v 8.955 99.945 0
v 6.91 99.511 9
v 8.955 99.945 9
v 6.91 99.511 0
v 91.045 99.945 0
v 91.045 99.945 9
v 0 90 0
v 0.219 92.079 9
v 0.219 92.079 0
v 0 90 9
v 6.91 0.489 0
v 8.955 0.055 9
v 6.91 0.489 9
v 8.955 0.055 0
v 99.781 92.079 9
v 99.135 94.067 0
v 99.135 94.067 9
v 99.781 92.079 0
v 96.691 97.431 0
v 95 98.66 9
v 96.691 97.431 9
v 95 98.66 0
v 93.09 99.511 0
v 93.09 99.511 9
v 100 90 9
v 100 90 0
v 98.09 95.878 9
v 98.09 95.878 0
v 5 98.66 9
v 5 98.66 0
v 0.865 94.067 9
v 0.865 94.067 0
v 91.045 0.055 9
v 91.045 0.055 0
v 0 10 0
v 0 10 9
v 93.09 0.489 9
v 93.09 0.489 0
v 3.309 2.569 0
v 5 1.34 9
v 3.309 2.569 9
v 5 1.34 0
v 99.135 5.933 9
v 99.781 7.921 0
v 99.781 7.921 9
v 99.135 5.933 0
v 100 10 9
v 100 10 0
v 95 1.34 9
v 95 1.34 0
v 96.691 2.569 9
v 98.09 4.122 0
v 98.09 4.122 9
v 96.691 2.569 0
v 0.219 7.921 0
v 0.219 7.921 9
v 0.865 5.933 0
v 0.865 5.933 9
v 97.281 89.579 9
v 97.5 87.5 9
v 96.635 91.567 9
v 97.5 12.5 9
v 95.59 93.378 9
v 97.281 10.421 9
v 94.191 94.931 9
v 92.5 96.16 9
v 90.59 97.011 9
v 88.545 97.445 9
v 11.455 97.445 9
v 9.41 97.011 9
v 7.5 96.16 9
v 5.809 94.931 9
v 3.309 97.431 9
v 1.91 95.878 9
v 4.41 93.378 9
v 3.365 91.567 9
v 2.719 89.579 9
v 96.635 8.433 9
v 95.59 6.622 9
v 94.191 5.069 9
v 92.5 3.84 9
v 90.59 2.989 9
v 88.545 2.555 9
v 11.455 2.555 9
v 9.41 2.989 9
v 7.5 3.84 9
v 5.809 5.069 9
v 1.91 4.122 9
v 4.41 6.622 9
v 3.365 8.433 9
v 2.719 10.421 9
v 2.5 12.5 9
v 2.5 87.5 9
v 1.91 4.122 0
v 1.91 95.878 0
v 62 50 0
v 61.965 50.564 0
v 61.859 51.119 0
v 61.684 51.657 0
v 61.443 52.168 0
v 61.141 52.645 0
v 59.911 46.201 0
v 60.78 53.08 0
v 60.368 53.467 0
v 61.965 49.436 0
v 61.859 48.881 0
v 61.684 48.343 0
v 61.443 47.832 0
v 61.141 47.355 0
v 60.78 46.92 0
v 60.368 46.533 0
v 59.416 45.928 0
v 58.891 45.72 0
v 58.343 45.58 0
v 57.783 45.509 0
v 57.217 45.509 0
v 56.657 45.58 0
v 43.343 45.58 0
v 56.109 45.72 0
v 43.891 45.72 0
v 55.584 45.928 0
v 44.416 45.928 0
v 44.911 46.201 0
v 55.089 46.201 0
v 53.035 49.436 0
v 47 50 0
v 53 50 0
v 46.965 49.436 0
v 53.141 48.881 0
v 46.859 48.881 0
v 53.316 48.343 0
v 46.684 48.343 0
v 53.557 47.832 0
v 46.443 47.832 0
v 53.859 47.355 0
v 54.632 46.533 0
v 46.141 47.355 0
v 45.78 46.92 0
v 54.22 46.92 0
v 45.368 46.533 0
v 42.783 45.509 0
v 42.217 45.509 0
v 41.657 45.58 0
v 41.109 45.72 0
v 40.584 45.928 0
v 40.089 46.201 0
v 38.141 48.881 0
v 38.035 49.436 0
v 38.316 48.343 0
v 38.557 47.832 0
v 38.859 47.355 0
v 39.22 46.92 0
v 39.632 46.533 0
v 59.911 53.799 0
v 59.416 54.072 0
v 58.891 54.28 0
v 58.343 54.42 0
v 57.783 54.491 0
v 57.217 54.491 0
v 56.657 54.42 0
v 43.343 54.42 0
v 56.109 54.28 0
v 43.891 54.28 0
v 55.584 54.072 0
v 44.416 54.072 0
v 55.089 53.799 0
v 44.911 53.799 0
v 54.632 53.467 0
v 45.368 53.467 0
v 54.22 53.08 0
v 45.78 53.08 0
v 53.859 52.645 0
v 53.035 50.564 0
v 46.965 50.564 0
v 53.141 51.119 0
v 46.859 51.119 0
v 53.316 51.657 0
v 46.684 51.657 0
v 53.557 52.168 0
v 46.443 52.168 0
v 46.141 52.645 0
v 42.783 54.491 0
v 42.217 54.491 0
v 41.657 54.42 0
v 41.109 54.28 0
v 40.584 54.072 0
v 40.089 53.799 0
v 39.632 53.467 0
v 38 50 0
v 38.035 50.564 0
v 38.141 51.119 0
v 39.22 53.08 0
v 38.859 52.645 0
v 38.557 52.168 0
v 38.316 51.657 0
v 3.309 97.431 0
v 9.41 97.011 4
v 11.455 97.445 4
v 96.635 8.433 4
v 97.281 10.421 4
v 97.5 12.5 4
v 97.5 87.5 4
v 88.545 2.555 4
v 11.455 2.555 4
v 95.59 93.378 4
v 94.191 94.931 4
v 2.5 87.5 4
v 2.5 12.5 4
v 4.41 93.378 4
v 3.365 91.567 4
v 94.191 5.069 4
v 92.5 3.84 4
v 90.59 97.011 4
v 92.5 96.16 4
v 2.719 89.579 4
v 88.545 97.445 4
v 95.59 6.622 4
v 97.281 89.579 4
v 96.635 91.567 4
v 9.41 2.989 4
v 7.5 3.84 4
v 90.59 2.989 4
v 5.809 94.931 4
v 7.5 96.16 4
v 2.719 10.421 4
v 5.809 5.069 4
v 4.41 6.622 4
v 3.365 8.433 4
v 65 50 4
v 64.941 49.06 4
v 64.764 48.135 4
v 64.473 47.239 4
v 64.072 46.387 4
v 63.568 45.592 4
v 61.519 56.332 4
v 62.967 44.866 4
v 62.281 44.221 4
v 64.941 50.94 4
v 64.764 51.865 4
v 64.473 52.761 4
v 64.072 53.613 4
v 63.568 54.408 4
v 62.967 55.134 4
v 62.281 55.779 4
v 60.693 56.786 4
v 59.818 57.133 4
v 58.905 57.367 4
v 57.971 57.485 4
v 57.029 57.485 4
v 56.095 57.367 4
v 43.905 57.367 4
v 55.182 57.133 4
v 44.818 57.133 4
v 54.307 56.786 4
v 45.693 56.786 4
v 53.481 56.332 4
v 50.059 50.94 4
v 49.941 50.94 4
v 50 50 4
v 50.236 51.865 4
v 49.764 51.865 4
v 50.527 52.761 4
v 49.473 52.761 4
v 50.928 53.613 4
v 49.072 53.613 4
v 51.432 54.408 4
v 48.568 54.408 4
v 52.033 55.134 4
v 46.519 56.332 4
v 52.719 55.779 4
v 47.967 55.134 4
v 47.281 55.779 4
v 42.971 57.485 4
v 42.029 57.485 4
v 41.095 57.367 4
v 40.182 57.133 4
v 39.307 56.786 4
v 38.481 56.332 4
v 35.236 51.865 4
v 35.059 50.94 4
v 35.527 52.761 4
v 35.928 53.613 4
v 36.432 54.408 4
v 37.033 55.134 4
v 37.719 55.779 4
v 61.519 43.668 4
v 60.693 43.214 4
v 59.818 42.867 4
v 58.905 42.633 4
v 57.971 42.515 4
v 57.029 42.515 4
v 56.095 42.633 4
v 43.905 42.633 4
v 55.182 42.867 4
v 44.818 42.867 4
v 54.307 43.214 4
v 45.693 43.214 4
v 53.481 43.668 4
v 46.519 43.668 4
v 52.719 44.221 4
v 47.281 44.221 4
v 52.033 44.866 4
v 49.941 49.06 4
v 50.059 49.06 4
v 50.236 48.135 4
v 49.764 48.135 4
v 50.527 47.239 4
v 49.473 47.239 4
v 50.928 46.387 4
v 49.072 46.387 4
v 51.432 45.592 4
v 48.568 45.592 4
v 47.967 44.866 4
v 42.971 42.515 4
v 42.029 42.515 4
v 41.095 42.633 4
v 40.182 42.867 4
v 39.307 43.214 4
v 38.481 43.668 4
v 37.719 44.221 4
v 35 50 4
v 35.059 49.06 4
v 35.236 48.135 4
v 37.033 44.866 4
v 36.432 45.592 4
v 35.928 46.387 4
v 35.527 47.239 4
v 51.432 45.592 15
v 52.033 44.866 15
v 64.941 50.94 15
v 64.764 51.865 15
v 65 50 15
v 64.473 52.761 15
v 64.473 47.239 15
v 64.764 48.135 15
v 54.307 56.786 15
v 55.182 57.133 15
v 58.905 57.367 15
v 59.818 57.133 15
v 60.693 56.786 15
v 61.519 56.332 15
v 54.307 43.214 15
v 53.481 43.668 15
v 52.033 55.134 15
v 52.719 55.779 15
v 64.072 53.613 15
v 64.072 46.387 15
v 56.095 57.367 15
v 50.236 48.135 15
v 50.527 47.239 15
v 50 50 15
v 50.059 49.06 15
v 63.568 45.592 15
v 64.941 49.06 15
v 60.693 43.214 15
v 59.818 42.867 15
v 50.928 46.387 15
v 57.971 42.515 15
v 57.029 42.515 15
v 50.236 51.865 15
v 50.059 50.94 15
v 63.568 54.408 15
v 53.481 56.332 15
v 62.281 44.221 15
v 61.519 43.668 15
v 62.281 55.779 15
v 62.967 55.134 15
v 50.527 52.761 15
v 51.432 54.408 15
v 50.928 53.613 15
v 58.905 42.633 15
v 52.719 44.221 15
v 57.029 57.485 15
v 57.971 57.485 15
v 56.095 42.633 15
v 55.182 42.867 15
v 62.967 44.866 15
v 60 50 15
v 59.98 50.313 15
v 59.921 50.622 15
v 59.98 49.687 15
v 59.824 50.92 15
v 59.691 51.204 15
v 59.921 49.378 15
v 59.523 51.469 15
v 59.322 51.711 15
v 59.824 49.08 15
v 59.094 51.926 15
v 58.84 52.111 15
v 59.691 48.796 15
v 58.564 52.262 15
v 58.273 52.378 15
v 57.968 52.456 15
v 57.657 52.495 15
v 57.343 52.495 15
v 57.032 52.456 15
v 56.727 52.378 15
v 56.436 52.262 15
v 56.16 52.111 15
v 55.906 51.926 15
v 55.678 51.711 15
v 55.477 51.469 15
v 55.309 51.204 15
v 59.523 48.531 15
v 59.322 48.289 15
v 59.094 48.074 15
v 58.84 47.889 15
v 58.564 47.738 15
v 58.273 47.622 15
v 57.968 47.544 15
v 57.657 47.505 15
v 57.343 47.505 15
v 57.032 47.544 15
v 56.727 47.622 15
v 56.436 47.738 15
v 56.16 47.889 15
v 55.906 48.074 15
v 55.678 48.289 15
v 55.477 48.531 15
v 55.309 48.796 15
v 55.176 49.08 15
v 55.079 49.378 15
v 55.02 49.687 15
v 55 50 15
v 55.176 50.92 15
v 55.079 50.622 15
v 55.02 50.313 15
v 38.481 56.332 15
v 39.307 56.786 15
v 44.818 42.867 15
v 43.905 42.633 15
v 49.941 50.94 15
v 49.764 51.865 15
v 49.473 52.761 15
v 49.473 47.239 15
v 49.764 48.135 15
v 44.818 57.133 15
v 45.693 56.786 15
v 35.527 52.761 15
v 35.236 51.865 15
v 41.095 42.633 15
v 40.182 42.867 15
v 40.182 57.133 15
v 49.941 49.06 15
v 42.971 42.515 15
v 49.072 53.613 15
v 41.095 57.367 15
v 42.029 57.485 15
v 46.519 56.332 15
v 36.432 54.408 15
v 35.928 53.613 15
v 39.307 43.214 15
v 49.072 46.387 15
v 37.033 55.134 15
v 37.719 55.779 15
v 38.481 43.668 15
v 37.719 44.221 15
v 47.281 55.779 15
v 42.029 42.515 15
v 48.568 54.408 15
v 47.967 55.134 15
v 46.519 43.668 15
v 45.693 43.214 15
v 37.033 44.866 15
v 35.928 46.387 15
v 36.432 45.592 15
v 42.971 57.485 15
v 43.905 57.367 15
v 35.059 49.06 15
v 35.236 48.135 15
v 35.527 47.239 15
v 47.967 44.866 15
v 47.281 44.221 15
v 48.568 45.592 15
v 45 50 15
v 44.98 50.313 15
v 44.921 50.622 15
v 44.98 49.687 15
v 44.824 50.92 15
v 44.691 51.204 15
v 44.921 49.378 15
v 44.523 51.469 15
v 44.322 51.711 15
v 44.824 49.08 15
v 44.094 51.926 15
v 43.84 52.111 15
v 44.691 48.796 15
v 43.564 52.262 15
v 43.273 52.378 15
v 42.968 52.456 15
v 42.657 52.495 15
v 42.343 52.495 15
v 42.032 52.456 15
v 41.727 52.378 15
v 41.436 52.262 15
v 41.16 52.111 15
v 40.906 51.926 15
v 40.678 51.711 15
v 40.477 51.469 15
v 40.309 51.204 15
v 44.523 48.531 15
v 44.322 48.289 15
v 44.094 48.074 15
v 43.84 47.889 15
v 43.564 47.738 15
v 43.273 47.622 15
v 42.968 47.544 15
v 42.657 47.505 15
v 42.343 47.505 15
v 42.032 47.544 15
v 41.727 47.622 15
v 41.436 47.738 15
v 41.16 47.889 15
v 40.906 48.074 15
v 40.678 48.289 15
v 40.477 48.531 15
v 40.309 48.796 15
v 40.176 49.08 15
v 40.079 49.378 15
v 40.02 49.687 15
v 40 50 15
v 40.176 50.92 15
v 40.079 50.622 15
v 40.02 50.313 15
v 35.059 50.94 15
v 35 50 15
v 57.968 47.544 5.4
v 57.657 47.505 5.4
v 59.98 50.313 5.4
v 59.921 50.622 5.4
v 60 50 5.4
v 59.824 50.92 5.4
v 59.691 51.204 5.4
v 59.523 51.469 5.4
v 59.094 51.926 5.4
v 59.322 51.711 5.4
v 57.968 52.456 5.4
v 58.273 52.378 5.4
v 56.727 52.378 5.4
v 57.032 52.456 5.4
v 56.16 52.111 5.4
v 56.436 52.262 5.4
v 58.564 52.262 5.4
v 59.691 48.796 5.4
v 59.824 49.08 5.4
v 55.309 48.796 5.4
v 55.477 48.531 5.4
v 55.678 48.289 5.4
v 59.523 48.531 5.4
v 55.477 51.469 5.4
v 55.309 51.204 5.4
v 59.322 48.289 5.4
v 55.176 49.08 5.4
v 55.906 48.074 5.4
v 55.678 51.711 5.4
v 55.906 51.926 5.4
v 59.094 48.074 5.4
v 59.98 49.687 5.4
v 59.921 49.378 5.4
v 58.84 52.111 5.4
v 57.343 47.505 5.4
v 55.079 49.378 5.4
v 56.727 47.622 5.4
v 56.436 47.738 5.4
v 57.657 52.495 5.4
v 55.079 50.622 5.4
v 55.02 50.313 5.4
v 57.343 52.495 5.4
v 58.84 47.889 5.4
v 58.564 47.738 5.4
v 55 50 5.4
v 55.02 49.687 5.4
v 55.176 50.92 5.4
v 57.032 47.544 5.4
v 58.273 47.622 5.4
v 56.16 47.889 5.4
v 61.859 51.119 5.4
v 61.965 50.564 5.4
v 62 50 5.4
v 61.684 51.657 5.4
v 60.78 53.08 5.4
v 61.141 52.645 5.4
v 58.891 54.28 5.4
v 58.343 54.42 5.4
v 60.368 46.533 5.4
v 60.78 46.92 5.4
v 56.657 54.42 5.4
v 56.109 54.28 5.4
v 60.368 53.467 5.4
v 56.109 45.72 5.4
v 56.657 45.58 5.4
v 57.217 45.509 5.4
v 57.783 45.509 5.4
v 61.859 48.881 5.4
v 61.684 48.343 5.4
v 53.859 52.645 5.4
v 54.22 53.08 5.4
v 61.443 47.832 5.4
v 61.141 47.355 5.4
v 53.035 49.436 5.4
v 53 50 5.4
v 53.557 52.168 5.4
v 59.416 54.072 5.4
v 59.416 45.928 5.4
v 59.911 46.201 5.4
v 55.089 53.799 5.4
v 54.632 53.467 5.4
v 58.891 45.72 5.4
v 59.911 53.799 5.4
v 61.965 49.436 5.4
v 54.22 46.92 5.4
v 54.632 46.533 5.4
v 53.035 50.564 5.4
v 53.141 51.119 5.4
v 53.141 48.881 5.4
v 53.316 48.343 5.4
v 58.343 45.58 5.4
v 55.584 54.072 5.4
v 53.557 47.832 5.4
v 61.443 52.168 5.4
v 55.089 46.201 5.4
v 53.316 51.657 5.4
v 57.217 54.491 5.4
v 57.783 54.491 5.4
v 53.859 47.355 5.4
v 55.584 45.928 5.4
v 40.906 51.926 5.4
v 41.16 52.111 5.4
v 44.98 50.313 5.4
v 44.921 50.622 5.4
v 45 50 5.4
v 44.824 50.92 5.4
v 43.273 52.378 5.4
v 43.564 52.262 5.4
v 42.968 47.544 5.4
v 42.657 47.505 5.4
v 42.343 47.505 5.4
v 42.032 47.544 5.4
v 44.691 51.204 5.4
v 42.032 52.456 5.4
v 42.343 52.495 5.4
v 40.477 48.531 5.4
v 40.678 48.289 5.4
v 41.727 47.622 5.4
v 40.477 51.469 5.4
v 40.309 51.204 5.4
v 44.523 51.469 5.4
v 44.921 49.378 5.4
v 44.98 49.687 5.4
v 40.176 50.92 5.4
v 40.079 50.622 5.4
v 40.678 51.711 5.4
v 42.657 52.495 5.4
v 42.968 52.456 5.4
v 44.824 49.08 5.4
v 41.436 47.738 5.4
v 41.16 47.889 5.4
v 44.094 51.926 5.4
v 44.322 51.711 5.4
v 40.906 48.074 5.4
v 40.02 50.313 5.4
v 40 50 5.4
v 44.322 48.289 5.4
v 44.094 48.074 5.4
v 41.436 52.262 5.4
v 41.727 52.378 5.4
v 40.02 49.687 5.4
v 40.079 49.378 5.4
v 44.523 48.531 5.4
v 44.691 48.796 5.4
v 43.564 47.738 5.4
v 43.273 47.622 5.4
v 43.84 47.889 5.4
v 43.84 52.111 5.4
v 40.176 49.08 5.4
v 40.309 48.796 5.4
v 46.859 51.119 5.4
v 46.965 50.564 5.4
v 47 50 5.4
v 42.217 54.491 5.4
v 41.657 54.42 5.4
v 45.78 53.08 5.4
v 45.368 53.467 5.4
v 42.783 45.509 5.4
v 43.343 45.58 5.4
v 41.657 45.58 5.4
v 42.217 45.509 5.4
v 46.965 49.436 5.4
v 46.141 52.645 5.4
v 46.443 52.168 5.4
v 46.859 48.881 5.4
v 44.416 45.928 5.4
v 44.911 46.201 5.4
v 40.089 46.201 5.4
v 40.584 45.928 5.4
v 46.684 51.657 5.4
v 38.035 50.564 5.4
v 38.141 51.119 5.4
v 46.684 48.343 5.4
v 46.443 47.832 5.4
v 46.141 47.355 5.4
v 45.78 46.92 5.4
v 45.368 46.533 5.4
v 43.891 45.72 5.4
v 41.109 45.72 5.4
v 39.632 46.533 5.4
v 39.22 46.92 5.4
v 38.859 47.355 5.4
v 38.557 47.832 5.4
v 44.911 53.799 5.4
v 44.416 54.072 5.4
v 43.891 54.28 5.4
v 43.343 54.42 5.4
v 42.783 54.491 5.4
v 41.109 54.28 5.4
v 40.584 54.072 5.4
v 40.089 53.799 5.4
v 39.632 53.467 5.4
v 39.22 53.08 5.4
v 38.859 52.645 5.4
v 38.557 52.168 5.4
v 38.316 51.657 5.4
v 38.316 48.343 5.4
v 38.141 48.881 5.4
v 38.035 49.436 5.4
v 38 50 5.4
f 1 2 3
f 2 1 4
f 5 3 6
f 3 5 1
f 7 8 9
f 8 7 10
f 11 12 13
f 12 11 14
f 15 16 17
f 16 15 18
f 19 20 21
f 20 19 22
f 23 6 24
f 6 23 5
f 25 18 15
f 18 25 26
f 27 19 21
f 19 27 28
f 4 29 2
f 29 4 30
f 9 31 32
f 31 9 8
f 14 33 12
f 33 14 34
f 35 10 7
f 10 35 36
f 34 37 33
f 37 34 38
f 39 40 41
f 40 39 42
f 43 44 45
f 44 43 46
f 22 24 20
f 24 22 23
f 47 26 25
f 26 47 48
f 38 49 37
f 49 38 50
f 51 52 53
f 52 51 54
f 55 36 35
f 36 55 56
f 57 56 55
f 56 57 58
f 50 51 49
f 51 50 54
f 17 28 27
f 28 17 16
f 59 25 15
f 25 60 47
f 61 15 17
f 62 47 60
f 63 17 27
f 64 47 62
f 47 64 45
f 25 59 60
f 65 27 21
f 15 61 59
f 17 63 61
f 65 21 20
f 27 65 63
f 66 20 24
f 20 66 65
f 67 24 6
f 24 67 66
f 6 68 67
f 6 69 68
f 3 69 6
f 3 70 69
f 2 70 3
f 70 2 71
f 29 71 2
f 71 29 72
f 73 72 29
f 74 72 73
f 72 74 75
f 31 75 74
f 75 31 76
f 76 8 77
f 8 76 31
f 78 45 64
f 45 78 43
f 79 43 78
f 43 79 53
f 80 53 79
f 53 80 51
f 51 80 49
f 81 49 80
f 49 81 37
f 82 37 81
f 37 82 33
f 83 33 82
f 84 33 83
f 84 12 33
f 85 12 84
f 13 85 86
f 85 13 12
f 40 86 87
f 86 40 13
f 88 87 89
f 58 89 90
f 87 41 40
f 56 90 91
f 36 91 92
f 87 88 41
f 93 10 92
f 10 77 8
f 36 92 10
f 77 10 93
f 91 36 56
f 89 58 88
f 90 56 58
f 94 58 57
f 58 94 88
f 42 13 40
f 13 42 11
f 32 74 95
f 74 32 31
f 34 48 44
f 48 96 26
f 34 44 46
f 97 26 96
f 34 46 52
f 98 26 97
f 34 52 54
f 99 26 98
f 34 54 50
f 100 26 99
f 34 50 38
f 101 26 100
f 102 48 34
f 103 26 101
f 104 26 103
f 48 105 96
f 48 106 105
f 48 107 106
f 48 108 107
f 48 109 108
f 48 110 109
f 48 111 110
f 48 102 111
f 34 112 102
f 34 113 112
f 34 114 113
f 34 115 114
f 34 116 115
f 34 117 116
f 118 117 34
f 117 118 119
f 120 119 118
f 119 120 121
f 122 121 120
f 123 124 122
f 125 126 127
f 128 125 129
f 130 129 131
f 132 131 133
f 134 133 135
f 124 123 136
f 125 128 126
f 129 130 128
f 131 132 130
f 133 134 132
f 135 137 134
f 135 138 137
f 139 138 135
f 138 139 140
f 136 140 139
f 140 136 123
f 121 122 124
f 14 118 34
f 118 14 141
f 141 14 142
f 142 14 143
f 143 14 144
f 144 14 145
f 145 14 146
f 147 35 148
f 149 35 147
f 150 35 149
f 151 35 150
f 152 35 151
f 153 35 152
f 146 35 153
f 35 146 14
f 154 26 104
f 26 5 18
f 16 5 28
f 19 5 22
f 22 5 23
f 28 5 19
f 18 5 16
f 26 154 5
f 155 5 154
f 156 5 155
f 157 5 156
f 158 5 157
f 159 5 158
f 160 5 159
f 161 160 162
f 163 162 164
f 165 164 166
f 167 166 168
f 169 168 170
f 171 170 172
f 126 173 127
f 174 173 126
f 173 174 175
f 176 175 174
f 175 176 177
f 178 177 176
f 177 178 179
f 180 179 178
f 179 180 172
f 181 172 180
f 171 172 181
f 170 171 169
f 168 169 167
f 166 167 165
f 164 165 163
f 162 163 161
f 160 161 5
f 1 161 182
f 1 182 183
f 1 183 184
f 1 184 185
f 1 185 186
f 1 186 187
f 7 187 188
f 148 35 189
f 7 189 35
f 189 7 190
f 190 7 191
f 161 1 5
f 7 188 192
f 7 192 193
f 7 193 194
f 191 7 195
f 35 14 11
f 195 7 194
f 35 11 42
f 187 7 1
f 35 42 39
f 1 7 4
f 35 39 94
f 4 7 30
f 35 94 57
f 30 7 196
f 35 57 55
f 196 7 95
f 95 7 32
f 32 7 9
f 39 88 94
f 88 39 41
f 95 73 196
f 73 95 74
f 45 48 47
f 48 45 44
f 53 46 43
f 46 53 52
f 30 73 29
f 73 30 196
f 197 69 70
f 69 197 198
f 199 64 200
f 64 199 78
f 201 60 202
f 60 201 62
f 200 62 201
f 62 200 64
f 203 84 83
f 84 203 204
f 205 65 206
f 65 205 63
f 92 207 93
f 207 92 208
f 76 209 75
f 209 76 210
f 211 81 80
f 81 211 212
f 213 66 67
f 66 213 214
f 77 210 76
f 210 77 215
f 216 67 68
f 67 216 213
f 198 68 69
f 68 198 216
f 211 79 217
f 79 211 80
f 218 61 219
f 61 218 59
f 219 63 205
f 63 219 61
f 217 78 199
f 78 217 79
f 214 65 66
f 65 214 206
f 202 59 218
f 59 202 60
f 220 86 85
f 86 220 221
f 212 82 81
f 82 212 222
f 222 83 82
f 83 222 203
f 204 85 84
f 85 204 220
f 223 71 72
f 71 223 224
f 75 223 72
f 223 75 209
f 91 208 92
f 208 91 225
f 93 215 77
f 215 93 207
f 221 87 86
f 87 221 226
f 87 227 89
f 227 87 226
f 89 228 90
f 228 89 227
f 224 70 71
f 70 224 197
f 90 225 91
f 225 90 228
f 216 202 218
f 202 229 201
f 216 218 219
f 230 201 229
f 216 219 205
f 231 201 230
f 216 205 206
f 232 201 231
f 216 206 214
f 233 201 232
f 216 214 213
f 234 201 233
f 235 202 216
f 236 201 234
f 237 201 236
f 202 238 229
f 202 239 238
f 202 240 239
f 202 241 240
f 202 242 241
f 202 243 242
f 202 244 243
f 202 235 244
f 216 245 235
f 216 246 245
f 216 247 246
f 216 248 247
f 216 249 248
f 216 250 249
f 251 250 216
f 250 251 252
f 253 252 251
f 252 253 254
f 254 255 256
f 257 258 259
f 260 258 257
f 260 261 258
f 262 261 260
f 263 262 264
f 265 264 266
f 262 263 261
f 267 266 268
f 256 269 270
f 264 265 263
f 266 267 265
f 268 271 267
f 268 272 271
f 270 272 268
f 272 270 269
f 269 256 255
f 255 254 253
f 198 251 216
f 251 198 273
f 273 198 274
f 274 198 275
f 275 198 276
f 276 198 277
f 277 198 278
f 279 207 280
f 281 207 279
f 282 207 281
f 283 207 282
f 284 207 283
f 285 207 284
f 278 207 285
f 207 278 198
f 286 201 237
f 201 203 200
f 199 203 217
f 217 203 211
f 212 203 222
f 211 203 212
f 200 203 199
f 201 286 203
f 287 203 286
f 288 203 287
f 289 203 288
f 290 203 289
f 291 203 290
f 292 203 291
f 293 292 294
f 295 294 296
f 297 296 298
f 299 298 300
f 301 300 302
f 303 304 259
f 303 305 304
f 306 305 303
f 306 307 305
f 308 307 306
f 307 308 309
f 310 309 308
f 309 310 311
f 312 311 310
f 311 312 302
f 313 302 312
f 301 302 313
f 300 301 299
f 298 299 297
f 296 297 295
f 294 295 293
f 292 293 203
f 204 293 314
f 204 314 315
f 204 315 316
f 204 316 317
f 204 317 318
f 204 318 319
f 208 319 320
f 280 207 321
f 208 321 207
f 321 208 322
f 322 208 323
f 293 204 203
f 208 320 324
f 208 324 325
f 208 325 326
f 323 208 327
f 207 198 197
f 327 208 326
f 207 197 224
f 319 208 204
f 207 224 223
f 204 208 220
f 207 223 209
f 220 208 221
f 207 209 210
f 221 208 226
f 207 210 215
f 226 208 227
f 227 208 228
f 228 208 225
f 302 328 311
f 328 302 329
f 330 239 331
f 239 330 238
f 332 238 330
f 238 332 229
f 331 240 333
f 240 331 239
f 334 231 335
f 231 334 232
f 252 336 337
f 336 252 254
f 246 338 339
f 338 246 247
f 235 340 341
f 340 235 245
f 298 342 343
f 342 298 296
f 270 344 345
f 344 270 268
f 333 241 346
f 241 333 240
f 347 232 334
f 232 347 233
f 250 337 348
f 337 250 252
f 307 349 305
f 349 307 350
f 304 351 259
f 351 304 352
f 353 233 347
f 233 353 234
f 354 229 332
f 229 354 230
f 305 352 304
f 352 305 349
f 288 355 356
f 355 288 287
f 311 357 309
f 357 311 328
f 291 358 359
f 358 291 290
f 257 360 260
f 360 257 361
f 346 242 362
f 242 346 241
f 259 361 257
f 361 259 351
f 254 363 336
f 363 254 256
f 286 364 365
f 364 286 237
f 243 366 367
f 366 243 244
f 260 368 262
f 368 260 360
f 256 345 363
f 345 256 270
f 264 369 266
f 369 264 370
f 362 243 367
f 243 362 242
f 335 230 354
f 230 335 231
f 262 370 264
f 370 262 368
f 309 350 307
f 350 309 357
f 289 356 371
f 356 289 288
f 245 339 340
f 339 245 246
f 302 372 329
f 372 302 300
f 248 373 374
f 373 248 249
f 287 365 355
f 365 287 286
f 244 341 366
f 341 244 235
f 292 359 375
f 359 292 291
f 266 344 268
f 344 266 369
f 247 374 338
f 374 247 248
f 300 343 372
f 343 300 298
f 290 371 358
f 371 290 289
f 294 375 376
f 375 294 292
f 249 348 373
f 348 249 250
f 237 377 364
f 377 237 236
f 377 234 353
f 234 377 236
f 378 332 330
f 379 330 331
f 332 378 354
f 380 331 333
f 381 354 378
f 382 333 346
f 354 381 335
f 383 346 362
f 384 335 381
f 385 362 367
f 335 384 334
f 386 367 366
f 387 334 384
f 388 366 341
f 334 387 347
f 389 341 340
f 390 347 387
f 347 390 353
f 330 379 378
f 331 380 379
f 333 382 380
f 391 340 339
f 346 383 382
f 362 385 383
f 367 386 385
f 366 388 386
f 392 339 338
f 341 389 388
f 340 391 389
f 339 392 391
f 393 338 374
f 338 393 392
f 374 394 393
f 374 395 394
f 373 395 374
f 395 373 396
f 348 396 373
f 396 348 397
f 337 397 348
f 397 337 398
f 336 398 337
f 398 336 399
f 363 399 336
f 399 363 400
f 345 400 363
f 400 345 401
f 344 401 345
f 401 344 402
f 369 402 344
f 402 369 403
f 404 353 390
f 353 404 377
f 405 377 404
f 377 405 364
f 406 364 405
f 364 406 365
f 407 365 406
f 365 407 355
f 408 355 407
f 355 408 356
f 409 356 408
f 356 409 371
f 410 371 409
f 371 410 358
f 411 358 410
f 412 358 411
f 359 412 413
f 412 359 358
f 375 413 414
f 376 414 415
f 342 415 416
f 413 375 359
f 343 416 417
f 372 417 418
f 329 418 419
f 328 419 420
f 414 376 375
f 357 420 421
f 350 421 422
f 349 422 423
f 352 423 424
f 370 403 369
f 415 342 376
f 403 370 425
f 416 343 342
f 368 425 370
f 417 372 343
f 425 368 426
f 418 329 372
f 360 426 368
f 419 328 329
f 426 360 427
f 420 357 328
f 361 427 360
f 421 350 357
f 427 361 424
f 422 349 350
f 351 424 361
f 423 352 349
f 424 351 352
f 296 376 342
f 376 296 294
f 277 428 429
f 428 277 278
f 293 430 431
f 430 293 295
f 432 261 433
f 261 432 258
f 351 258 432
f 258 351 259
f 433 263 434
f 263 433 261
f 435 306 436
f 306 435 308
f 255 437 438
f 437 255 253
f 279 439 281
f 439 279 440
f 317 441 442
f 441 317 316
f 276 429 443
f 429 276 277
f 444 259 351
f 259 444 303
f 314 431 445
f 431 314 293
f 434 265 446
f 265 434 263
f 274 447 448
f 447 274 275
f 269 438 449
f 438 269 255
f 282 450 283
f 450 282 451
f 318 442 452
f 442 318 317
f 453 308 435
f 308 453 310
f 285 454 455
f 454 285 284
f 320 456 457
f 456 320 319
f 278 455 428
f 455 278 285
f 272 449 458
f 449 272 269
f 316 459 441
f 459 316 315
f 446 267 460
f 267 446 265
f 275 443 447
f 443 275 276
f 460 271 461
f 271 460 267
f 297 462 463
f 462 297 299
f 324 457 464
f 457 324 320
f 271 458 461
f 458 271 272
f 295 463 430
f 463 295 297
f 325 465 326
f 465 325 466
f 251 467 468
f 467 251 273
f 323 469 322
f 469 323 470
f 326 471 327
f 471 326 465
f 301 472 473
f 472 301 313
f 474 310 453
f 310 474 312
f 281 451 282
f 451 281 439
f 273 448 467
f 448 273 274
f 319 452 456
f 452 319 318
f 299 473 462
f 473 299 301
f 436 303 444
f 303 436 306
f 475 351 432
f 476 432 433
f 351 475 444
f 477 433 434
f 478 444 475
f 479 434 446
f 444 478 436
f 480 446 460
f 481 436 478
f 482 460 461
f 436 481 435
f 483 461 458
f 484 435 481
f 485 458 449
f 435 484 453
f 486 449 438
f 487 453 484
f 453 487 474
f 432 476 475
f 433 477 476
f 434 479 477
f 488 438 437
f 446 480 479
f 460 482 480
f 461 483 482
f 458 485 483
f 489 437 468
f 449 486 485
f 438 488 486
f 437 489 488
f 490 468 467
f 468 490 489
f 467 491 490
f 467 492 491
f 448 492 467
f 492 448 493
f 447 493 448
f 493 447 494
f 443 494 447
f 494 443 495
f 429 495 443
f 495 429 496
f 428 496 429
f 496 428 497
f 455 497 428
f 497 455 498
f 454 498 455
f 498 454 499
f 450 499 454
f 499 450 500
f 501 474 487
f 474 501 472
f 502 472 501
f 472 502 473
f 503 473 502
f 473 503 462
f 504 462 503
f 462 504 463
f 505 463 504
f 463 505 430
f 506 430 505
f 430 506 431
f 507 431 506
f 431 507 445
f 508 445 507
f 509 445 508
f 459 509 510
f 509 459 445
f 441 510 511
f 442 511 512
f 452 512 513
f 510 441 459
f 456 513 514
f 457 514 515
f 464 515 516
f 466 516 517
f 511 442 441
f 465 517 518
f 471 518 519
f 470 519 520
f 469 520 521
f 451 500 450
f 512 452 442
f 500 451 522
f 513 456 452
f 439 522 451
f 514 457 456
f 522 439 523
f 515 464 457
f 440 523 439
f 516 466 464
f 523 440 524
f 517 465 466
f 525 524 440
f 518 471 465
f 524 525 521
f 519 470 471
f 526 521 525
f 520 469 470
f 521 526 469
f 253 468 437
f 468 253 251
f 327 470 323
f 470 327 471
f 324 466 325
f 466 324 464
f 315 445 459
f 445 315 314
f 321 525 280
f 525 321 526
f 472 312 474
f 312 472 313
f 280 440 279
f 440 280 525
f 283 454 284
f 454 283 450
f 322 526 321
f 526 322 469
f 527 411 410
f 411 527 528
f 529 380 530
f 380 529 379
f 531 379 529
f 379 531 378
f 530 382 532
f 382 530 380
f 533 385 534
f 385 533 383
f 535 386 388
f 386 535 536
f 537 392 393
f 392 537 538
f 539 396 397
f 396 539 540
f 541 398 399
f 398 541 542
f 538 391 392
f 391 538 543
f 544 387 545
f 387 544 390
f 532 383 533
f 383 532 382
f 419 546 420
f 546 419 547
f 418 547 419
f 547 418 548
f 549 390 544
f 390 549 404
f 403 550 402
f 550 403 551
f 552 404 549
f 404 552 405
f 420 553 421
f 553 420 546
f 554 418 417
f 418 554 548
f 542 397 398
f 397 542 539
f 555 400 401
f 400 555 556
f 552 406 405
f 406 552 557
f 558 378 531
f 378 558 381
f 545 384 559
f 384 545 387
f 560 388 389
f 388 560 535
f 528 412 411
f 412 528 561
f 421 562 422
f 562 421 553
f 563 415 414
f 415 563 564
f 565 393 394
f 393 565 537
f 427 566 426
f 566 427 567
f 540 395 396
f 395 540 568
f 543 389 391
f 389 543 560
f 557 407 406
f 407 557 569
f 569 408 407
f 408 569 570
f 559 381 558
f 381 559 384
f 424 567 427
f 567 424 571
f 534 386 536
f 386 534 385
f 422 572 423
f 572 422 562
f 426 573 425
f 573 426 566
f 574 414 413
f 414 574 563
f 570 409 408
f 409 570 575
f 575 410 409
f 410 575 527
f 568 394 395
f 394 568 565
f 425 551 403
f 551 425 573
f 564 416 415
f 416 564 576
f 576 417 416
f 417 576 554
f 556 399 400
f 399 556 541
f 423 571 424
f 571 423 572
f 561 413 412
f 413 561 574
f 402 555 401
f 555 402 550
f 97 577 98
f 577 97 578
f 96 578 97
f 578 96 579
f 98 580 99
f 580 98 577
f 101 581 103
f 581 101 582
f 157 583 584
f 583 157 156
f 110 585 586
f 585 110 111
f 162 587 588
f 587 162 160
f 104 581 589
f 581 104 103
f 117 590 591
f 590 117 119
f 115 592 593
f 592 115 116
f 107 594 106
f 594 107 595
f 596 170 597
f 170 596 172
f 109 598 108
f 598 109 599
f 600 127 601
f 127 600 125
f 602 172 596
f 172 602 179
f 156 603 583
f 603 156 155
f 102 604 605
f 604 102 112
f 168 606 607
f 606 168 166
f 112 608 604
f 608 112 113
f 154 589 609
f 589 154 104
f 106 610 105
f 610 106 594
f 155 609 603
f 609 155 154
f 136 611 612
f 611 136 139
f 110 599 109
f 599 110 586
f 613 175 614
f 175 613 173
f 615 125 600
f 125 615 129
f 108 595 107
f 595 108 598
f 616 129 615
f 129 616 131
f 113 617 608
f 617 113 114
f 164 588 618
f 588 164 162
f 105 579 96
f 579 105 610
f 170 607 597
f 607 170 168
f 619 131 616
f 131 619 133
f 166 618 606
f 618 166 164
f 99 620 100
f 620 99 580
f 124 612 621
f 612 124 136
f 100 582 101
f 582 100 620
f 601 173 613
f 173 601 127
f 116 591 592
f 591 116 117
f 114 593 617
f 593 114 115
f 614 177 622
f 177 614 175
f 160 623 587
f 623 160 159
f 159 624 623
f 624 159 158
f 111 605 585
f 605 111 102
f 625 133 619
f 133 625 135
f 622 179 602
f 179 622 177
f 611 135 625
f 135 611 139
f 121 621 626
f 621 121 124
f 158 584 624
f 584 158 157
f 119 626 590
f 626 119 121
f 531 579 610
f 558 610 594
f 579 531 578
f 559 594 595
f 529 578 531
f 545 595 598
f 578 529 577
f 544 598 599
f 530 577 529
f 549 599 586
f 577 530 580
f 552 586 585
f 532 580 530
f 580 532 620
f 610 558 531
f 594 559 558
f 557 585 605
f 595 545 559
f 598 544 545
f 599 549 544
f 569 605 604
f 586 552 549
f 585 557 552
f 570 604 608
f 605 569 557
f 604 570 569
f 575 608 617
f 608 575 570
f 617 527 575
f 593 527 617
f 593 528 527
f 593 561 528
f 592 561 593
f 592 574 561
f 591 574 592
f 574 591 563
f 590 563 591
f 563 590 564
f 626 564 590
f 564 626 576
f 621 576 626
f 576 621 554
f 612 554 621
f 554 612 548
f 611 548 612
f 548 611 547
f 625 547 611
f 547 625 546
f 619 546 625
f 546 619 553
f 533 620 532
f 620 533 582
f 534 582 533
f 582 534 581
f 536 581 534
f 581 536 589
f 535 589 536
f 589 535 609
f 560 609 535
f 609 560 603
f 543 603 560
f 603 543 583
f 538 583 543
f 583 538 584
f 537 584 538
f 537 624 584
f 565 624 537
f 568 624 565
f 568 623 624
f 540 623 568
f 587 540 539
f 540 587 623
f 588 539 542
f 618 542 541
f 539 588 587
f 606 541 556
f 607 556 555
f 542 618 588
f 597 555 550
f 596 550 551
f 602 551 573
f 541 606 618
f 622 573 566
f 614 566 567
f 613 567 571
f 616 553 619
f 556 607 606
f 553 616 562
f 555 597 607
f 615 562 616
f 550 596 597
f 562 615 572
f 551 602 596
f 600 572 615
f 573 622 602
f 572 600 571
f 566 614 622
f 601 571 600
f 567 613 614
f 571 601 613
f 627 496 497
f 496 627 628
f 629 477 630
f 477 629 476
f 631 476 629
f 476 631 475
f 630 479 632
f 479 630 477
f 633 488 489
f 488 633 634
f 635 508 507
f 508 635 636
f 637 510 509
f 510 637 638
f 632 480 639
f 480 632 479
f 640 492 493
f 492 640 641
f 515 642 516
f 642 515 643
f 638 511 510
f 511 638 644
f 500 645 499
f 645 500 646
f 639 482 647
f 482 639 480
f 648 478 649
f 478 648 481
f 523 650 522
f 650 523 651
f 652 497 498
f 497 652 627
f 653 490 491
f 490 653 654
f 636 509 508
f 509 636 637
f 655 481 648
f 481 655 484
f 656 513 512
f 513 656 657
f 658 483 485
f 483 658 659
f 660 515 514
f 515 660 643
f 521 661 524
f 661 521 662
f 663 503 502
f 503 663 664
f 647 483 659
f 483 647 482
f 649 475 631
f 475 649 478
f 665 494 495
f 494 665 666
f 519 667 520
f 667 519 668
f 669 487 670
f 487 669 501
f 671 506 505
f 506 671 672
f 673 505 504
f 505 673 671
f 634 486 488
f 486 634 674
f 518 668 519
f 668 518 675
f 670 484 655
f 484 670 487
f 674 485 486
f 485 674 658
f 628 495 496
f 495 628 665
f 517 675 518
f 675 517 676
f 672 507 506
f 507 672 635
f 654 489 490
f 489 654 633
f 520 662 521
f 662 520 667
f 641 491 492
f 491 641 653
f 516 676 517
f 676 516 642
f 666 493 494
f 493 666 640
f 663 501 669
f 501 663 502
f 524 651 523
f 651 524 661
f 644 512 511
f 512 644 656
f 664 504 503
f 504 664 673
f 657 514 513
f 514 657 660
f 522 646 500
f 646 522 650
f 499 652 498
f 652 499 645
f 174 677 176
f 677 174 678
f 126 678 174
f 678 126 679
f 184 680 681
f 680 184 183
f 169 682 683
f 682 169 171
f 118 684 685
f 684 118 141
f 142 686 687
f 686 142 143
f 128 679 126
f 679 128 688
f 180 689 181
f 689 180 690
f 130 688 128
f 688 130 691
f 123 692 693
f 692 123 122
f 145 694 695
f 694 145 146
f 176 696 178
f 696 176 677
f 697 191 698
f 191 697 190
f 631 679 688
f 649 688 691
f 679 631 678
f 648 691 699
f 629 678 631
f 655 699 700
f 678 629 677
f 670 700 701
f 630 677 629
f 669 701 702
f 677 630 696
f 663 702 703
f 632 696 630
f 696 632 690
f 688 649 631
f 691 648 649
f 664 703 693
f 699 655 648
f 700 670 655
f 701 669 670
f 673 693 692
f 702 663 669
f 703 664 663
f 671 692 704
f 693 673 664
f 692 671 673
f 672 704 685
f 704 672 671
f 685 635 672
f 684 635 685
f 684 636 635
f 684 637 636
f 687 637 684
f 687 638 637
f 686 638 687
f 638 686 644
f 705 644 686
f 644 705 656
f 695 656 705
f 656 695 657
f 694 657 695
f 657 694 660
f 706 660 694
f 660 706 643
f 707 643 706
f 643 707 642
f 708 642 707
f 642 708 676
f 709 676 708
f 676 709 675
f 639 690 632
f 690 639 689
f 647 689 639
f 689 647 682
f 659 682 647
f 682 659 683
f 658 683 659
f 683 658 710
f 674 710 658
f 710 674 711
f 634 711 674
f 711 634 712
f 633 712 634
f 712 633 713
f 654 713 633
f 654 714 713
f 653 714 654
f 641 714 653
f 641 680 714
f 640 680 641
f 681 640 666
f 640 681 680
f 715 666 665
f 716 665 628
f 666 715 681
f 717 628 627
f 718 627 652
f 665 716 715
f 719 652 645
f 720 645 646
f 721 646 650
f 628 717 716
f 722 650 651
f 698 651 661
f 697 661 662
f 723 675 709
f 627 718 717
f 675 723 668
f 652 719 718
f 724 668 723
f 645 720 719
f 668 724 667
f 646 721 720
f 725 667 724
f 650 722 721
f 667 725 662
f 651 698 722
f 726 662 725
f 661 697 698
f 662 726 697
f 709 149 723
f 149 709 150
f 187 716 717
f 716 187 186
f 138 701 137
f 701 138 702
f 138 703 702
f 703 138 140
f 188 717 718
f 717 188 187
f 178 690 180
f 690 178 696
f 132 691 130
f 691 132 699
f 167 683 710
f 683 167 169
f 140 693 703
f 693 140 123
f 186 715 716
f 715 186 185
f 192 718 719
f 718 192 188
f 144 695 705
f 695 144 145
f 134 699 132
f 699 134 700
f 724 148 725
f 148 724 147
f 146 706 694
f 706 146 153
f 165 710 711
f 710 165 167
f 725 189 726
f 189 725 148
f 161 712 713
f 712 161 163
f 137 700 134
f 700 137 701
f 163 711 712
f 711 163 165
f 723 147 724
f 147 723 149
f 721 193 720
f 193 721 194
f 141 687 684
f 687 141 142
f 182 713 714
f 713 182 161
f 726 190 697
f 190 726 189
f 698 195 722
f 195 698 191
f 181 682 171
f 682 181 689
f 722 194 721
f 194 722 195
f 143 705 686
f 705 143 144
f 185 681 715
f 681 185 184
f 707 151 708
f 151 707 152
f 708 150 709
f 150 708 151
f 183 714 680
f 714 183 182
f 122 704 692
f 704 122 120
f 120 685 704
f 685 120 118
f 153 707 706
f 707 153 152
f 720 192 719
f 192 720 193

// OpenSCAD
// file: LoadCellRx.scad
/* TAL220 Load Cell Rx - Receives cable (base) end of TAL220
    Copyright (C) 2019 Benjamin Hubbard

    This program is free software: you can redistribute it and/or modify
    it under the terms of the GNU General Public License as published by
    the Free Software Foundation, either version 3 of the License, or
    (at your option) any later version.

    This program is distributed in the hope that it will be useful,
    but WITHOUT ANY WARRANTY; without even the implied warranty of
    MERCHANTABILITY or FITNESS FOR A PARTICULAR PURPOSE.  See the
    GNU General Public License for more details.

    You should have received a copy of the GNU General Public License
    along with this program.  If not, see <https://www.gnu.org/licenses/>.
 */

// General resolution.
$fn = 50;

// Place samples.
translate([ -10, -10, 0 ]) TAL220("M4");
translate([ -10, 10, 0 ]) TAL220("M5");
translate([ 20, 10, 0 ]) TAL221();

translate([ -10, -30, 0 ]) TAL220("M4", 2);
translate([ -10, 30, 0 ]) TAL220("M5", 2);
translate([ 20, -10, 0 ]) TAL221(2);

// Nut cutout.
// E = corner to corner.
E_M3 = 6.2; // M3: 6.01-6.35
E_M4 = 9;   // M4: 7.66-8.08
E_M5 = 10;  // M5: 8.79-9.24

// M = thickness.
M_M3 = 2.4; // M3: 2.15-2.40
M_M4 = 4.4; // M4: 2.90-3.20 Screw head height = 4
M_M5 = 5.4; // M5: 4.40-4.70 Screw head height = 5

// Thru hole diameters (M4 or M5).
diam_M3 = 4;    // 3.5;
diam_M4 = 5;    // 4.5;
diam_M5 = 6.25; // 5.5;

// Screw locations.
holeX_220 = [ 7.5, -7.5 ];
holeY_220 = [ 0, 0 ];

holeX_221 = [ 0, 0 ];
holeY_221 = [ -3, 3 ];

// Large beam strain gage.
module TAL220(MX, Cutout)
{
    // 0 = Full stand-off.
    // 1 = Solid Boss.
    // 2 = Screw Cutout.
    if (is_undef(Cutout) || Cutout == 0)
    {
        if (MX == "M4")
        {
            Rx(E_M4, M_M4, holeX_220, holeY_220, diam_M4);
        }

        if (MX == "M5")
        {
            Rx(E_M5, M_M5, holeX_220, holeY_220, diam_M5);
        }
    }

    if (Cutout == 1)
    {
        if (MX == "M4")
        {
            RxBoss(holeX_220, holeY_220, E_M4);
        }

        if (MX == "M5")
        {
            RxBoss(holeX_220, holeY_220, E_M5);
        }
    }

    if (Cutout == 2)
    {
        if (MX == "M4")
        {
            RxThruHole(E_M4, M_M5, holeX_220, holeY_220, diam_M4);
        }

        if (MX == "M5")
        {
            RxThruHole(E_M5, M_M5, holeX_220, holeY_220, diam_M5);
        }
    }
}

// Small beam strain gage.
module TAL221(Cutout)
{
    if (is_undef(Cutout) || Cutout == 0)
    {
        Rx(E_M3, M_M3, holeX_221, holeY_221, diam_M3);
    }

    if (Cutout == 1)
    {
        RxBoss(holeX_221, holeY_221, E_M3);
    }

    if (Cutout == 2)
    {
        RxThruHole(E_M3, M_M3, holeX_221, holeY_221, diam_M3);
    }
}

// Building Blocks.
// Boss for screw to pass through.
module RxBoss(holeX, holeY, E)
{
    for (i = [0:1])
    {
        translate([ holeX[i], holeY[i], 0 ]) cylinder(d = E + 6, h = 15);
    }
}

// Through hole (holds screw and nut).
module RxThruHole(E, M, holeX, holeY, diam)
{
    // Thru hole
    for (i = [0:1])
    {
        translate([ holeX[i], holeY[i], 0 ]) cylinder(d = diam, h = 15);

        // Nut receiver
        translate([ holeX[i], holeY[i], 0 ]) cylinder(d = E, h = M); //, $fn=6);
    }
}

// Build the full receiver (thru hole cut out of boss).
module Rx(E, M, holeX, holeY, diam)
{
    translate([ 0, 0, 0 ]) difference()
    {
        RxBoss(holeX, holeY, E);
        RxThruHole(E, M, holeX, holeY, diam);
    }
}
// main file
/* OS Nano Balance - Bed: Accepts mass, connects to load cells
    Copyright (C) 2019 Benjamin Hubbard

    This program is free software: you can redistribute it and/or modify
    it under the terms of the GNU General Public License as published by
    the Free Software Foundation, either version 3 of the License, or
    (at your option) any later version.

    This program is distributed in the hope that it will be useful,
    but WITHOUT ANY WARRANTY; without even the implied warranty of
    MERCHANTABILITY or FITNESS FOR A PARTICULAR PURPOSE.  See the
    GNU General Public License for more details.

    You should have received a copy of the GNU General Public License
    along with this program.  If not, see <https://www.gnu.org/licenses/>.
*/

// Library of LoadCell receivers.
use <LoadCellRx.scad>;

// Bed dimensions.
minkowskiDim = [ 10, 10, 1 ];
oDim = [ 100, 100, 10 ]; //[150, 150, 10];
iDim = [ 95, 95, 6 ];    //[144, 144, 6];
// Dimensional difference - for placement.
diff = oDim - iDim;

// Make the main body.
difference()
{
    union()
    {
        translate([ minkowskiDim[0], minkowskiDim[1], 0 ]) difference()
        {
            minkowski()
            {
                cube(oDim - minkowskiDim * 2);
                cylinder(r = minkowskiDim[0], h = minkowskiDim[2]);
            }
            minkowski()
            {
                translate([ diff[0] / 2, diff[1] / 2, diff[2] ]) cube(iDim - minkowskiDim * 2);
                cylinder(r = minkowskiDim[0], h = minkowskiDim[2] * 2);
            }
        }
        // Place the TAL221 at the center. The top of the hex cutout is at the origin of the Rx unit.
        // translate([oDim[0]/2, oDim[1]/2, 0])TAL221(1);

        // Place the TAL220 at the center. It's sized so that it fits around the TAL221.
        translate([ oDim[0] / 2, oDim[1] / 2, 0 ]) TAL220("M4", 1);
    }

    // Place the TAL221 at the center. The top of the hex cutout is at the origin of the Rx unit.
    // translate([oDim[0]/2, oDim[1]/2, 0])TAL221(2);

    // Place the TAL220 at the center. It's sized so that it fits around the TAL221.
    translate([ oDim[0] / 2, oDim[1] / 2, 0 ]) TAL220("M4", 2);
}
